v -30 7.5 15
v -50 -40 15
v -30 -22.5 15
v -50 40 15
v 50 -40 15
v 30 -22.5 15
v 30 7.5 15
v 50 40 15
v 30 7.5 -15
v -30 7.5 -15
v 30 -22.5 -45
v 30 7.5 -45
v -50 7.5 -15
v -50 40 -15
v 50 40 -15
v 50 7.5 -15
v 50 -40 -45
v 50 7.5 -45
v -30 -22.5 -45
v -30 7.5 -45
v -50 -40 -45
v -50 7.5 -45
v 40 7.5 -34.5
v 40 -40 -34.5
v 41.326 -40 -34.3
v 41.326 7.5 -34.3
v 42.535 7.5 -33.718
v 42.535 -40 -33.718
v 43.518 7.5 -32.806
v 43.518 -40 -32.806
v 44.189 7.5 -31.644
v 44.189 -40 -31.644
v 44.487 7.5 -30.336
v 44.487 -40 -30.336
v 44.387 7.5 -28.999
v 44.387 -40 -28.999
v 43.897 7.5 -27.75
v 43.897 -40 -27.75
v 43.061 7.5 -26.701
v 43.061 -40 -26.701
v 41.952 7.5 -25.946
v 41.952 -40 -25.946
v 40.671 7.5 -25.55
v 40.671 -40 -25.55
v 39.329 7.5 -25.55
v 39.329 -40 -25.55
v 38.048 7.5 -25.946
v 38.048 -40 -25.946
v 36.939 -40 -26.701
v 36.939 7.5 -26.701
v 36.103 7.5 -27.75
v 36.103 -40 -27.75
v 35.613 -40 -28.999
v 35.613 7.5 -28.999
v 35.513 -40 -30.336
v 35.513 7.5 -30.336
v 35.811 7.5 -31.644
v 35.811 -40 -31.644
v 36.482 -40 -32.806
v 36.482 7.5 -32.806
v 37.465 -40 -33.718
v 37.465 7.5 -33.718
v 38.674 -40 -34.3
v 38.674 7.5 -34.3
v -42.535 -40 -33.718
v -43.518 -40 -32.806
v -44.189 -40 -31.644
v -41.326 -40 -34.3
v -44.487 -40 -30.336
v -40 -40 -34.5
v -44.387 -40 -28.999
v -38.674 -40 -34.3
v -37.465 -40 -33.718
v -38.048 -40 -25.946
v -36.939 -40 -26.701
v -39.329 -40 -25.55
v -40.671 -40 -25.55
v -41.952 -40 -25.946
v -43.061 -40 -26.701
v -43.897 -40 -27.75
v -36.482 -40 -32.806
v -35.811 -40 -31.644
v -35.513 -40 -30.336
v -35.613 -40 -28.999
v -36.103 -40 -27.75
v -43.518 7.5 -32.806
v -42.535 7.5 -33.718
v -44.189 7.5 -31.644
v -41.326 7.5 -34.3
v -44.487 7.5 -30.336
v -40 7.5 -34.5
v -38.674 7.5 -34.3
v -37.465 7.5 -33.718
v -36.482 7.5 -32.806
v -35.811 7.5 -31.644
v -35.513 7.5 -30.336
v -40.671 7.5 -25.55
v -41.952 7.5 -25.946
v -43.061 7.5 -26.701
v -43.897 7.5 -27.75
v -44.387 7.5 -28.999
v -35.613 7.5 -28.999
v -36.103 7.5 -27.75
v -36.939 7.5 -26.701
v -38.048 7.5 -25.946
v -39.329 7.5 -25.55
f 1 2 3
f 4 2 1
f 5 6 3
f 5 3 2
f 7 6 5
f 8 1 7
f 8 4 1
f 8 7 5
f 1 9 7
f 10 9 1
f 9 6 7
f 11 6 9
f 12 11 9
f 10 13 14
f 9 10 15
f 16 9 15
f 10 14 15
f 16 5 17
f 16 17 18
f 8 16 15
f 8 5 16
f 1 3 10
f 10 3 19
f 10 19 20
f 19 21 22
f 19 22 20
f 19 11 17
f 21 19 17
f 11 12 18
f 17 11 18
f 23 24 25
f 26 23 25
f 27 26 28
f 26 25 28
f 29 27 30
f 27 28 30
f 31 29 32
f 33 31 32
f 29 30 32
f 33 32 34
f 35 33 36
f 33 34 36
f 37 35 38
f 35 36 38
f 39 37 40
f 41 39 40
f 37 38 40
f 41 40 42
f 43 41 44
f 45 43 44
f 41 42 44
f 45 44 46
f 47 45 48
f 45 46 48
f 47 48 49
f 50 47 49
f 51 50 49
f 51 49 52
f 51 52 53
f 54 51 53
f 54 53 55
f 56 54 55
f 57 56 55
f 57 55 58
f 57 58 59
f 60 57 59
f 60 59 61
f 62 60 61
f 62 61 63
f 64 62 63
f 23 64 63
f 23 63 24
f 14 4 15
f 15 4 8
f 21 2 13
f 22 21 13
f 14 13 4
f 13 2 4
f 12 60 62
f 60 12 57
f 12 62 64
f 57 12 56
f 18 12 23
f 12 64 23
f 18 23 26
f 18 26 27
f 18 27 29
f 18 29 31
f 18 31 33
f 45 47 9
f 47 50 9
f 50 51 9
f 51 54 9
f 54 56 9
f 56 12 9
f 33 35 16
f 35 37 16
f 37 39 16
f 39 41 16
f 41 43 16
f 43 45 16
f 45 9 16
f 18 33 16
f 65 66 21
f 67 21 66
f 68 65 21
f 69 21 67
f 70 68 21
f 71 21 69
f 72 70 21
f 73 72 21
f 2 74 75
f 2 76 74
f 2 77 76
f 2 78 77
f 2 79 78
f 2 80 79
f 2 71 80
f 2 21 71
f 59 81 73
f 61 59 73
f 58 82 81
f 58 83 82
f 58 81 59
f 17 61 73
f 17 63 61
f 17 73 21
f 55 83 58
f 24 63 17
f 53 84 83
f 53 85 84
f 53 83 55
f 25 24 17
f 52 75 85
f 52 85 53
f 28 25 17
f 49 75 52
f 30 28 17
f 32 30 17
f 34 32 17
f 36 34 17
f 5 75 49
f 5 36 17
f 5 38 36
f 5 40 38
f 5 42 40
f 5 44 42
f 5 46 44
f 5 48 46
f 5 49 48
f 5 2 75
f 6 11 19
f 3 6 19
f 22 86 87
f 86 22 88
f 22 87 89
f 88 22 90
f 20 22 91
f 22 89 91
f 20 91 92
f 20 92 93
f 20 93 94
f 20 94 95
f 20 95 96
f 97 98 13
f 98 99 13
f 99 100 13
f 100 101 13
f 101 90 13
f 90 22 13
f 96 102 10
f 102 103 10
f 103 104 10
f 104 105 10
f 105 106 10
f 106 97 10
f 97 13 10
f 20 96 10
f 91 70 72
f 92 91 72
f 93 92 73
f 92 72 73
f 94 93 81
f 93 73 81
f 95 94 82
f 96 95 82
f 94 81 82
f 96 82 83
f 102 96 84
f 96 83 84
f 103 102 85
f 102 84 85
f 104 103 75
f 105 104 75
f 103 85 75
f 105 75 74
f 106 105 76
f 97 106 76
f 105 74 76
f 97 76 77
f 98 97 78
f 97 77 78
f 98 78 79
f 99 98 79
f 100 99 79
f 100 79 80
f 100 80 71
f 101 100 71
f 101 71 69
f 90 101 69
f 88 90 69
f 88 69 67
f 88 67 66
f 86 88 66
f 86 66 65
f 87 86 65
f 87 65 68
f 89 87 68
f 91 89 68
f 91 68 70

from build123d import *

# Parameters (mm, degrees)
SKETCH_1_W          = 100
SKETCH_1_H          = 80
EXTRUDE_1_DEPTH     = 15
SKETCH_4_W          = 100
SKETCH_4_H          = 47.5
EXTRUDE_2_DEPTH     = 30
SKETCH_2_W          = 60
SKETCH_2_H          = 30
CUT_EXTRUDE_1_DEPTH = 54.5
SKETCH_5_R          = 4.5
CUT_EXTRUDE_2_DEPTH = 105.522724802


with BuildPart() as part:
    # 草图1 → 凸台-拉伸1 (new, symmetric)
    with BuildSketch(Plane.XY):
        Rectangle(SKETCH_1_W, SKETCH_1_H)
    extrude(amount=EXTRUDE_1_DEPTH, both=True)

    # 草图4 → 凸台-拉伸2 (add)
    with BuildSketch(Plane.XY.offset(-15)):
        with Locations((0, -16.25)):
            Rectangle(SKETCH_4_W, SKETCH_4_H)
    extrude(amount=-EXTRUDE_2_DEPTH)

    # 草图2 → 切除-拉伸1 (cut, symmetric)
    with BuildSketch(Plane(origin=(0, 0, -15), x_dir=(-1, 0, 0), z_dir=(0, 0, -1))):
        with Locations((0, -7.5)):
            Rectangle(SKETCH_2_W, SKETCH_2_H)
    extrude(amount=CUT_EXTRUDE_1_DEPTH, both=True, mode=Mode.SUBTRACT)

    # 草图5 → 切除-拉伸2 (cut, through all)
    with BuildSketch(Plane.XZ.offset(40)):
        with Locations(Location((-40, -30, 0), (0, 0, 270))):
            Circle(SKETCH_5_R)
        with Locations(Location((40, -30, 0), (0, 0, 270))):
            Circle(SKETCH_5_R)
    extrude(amount=-CUT_EXTRUDE_2_DEPTH, mode=Mode.SUBTRACT)


solid = part.part
